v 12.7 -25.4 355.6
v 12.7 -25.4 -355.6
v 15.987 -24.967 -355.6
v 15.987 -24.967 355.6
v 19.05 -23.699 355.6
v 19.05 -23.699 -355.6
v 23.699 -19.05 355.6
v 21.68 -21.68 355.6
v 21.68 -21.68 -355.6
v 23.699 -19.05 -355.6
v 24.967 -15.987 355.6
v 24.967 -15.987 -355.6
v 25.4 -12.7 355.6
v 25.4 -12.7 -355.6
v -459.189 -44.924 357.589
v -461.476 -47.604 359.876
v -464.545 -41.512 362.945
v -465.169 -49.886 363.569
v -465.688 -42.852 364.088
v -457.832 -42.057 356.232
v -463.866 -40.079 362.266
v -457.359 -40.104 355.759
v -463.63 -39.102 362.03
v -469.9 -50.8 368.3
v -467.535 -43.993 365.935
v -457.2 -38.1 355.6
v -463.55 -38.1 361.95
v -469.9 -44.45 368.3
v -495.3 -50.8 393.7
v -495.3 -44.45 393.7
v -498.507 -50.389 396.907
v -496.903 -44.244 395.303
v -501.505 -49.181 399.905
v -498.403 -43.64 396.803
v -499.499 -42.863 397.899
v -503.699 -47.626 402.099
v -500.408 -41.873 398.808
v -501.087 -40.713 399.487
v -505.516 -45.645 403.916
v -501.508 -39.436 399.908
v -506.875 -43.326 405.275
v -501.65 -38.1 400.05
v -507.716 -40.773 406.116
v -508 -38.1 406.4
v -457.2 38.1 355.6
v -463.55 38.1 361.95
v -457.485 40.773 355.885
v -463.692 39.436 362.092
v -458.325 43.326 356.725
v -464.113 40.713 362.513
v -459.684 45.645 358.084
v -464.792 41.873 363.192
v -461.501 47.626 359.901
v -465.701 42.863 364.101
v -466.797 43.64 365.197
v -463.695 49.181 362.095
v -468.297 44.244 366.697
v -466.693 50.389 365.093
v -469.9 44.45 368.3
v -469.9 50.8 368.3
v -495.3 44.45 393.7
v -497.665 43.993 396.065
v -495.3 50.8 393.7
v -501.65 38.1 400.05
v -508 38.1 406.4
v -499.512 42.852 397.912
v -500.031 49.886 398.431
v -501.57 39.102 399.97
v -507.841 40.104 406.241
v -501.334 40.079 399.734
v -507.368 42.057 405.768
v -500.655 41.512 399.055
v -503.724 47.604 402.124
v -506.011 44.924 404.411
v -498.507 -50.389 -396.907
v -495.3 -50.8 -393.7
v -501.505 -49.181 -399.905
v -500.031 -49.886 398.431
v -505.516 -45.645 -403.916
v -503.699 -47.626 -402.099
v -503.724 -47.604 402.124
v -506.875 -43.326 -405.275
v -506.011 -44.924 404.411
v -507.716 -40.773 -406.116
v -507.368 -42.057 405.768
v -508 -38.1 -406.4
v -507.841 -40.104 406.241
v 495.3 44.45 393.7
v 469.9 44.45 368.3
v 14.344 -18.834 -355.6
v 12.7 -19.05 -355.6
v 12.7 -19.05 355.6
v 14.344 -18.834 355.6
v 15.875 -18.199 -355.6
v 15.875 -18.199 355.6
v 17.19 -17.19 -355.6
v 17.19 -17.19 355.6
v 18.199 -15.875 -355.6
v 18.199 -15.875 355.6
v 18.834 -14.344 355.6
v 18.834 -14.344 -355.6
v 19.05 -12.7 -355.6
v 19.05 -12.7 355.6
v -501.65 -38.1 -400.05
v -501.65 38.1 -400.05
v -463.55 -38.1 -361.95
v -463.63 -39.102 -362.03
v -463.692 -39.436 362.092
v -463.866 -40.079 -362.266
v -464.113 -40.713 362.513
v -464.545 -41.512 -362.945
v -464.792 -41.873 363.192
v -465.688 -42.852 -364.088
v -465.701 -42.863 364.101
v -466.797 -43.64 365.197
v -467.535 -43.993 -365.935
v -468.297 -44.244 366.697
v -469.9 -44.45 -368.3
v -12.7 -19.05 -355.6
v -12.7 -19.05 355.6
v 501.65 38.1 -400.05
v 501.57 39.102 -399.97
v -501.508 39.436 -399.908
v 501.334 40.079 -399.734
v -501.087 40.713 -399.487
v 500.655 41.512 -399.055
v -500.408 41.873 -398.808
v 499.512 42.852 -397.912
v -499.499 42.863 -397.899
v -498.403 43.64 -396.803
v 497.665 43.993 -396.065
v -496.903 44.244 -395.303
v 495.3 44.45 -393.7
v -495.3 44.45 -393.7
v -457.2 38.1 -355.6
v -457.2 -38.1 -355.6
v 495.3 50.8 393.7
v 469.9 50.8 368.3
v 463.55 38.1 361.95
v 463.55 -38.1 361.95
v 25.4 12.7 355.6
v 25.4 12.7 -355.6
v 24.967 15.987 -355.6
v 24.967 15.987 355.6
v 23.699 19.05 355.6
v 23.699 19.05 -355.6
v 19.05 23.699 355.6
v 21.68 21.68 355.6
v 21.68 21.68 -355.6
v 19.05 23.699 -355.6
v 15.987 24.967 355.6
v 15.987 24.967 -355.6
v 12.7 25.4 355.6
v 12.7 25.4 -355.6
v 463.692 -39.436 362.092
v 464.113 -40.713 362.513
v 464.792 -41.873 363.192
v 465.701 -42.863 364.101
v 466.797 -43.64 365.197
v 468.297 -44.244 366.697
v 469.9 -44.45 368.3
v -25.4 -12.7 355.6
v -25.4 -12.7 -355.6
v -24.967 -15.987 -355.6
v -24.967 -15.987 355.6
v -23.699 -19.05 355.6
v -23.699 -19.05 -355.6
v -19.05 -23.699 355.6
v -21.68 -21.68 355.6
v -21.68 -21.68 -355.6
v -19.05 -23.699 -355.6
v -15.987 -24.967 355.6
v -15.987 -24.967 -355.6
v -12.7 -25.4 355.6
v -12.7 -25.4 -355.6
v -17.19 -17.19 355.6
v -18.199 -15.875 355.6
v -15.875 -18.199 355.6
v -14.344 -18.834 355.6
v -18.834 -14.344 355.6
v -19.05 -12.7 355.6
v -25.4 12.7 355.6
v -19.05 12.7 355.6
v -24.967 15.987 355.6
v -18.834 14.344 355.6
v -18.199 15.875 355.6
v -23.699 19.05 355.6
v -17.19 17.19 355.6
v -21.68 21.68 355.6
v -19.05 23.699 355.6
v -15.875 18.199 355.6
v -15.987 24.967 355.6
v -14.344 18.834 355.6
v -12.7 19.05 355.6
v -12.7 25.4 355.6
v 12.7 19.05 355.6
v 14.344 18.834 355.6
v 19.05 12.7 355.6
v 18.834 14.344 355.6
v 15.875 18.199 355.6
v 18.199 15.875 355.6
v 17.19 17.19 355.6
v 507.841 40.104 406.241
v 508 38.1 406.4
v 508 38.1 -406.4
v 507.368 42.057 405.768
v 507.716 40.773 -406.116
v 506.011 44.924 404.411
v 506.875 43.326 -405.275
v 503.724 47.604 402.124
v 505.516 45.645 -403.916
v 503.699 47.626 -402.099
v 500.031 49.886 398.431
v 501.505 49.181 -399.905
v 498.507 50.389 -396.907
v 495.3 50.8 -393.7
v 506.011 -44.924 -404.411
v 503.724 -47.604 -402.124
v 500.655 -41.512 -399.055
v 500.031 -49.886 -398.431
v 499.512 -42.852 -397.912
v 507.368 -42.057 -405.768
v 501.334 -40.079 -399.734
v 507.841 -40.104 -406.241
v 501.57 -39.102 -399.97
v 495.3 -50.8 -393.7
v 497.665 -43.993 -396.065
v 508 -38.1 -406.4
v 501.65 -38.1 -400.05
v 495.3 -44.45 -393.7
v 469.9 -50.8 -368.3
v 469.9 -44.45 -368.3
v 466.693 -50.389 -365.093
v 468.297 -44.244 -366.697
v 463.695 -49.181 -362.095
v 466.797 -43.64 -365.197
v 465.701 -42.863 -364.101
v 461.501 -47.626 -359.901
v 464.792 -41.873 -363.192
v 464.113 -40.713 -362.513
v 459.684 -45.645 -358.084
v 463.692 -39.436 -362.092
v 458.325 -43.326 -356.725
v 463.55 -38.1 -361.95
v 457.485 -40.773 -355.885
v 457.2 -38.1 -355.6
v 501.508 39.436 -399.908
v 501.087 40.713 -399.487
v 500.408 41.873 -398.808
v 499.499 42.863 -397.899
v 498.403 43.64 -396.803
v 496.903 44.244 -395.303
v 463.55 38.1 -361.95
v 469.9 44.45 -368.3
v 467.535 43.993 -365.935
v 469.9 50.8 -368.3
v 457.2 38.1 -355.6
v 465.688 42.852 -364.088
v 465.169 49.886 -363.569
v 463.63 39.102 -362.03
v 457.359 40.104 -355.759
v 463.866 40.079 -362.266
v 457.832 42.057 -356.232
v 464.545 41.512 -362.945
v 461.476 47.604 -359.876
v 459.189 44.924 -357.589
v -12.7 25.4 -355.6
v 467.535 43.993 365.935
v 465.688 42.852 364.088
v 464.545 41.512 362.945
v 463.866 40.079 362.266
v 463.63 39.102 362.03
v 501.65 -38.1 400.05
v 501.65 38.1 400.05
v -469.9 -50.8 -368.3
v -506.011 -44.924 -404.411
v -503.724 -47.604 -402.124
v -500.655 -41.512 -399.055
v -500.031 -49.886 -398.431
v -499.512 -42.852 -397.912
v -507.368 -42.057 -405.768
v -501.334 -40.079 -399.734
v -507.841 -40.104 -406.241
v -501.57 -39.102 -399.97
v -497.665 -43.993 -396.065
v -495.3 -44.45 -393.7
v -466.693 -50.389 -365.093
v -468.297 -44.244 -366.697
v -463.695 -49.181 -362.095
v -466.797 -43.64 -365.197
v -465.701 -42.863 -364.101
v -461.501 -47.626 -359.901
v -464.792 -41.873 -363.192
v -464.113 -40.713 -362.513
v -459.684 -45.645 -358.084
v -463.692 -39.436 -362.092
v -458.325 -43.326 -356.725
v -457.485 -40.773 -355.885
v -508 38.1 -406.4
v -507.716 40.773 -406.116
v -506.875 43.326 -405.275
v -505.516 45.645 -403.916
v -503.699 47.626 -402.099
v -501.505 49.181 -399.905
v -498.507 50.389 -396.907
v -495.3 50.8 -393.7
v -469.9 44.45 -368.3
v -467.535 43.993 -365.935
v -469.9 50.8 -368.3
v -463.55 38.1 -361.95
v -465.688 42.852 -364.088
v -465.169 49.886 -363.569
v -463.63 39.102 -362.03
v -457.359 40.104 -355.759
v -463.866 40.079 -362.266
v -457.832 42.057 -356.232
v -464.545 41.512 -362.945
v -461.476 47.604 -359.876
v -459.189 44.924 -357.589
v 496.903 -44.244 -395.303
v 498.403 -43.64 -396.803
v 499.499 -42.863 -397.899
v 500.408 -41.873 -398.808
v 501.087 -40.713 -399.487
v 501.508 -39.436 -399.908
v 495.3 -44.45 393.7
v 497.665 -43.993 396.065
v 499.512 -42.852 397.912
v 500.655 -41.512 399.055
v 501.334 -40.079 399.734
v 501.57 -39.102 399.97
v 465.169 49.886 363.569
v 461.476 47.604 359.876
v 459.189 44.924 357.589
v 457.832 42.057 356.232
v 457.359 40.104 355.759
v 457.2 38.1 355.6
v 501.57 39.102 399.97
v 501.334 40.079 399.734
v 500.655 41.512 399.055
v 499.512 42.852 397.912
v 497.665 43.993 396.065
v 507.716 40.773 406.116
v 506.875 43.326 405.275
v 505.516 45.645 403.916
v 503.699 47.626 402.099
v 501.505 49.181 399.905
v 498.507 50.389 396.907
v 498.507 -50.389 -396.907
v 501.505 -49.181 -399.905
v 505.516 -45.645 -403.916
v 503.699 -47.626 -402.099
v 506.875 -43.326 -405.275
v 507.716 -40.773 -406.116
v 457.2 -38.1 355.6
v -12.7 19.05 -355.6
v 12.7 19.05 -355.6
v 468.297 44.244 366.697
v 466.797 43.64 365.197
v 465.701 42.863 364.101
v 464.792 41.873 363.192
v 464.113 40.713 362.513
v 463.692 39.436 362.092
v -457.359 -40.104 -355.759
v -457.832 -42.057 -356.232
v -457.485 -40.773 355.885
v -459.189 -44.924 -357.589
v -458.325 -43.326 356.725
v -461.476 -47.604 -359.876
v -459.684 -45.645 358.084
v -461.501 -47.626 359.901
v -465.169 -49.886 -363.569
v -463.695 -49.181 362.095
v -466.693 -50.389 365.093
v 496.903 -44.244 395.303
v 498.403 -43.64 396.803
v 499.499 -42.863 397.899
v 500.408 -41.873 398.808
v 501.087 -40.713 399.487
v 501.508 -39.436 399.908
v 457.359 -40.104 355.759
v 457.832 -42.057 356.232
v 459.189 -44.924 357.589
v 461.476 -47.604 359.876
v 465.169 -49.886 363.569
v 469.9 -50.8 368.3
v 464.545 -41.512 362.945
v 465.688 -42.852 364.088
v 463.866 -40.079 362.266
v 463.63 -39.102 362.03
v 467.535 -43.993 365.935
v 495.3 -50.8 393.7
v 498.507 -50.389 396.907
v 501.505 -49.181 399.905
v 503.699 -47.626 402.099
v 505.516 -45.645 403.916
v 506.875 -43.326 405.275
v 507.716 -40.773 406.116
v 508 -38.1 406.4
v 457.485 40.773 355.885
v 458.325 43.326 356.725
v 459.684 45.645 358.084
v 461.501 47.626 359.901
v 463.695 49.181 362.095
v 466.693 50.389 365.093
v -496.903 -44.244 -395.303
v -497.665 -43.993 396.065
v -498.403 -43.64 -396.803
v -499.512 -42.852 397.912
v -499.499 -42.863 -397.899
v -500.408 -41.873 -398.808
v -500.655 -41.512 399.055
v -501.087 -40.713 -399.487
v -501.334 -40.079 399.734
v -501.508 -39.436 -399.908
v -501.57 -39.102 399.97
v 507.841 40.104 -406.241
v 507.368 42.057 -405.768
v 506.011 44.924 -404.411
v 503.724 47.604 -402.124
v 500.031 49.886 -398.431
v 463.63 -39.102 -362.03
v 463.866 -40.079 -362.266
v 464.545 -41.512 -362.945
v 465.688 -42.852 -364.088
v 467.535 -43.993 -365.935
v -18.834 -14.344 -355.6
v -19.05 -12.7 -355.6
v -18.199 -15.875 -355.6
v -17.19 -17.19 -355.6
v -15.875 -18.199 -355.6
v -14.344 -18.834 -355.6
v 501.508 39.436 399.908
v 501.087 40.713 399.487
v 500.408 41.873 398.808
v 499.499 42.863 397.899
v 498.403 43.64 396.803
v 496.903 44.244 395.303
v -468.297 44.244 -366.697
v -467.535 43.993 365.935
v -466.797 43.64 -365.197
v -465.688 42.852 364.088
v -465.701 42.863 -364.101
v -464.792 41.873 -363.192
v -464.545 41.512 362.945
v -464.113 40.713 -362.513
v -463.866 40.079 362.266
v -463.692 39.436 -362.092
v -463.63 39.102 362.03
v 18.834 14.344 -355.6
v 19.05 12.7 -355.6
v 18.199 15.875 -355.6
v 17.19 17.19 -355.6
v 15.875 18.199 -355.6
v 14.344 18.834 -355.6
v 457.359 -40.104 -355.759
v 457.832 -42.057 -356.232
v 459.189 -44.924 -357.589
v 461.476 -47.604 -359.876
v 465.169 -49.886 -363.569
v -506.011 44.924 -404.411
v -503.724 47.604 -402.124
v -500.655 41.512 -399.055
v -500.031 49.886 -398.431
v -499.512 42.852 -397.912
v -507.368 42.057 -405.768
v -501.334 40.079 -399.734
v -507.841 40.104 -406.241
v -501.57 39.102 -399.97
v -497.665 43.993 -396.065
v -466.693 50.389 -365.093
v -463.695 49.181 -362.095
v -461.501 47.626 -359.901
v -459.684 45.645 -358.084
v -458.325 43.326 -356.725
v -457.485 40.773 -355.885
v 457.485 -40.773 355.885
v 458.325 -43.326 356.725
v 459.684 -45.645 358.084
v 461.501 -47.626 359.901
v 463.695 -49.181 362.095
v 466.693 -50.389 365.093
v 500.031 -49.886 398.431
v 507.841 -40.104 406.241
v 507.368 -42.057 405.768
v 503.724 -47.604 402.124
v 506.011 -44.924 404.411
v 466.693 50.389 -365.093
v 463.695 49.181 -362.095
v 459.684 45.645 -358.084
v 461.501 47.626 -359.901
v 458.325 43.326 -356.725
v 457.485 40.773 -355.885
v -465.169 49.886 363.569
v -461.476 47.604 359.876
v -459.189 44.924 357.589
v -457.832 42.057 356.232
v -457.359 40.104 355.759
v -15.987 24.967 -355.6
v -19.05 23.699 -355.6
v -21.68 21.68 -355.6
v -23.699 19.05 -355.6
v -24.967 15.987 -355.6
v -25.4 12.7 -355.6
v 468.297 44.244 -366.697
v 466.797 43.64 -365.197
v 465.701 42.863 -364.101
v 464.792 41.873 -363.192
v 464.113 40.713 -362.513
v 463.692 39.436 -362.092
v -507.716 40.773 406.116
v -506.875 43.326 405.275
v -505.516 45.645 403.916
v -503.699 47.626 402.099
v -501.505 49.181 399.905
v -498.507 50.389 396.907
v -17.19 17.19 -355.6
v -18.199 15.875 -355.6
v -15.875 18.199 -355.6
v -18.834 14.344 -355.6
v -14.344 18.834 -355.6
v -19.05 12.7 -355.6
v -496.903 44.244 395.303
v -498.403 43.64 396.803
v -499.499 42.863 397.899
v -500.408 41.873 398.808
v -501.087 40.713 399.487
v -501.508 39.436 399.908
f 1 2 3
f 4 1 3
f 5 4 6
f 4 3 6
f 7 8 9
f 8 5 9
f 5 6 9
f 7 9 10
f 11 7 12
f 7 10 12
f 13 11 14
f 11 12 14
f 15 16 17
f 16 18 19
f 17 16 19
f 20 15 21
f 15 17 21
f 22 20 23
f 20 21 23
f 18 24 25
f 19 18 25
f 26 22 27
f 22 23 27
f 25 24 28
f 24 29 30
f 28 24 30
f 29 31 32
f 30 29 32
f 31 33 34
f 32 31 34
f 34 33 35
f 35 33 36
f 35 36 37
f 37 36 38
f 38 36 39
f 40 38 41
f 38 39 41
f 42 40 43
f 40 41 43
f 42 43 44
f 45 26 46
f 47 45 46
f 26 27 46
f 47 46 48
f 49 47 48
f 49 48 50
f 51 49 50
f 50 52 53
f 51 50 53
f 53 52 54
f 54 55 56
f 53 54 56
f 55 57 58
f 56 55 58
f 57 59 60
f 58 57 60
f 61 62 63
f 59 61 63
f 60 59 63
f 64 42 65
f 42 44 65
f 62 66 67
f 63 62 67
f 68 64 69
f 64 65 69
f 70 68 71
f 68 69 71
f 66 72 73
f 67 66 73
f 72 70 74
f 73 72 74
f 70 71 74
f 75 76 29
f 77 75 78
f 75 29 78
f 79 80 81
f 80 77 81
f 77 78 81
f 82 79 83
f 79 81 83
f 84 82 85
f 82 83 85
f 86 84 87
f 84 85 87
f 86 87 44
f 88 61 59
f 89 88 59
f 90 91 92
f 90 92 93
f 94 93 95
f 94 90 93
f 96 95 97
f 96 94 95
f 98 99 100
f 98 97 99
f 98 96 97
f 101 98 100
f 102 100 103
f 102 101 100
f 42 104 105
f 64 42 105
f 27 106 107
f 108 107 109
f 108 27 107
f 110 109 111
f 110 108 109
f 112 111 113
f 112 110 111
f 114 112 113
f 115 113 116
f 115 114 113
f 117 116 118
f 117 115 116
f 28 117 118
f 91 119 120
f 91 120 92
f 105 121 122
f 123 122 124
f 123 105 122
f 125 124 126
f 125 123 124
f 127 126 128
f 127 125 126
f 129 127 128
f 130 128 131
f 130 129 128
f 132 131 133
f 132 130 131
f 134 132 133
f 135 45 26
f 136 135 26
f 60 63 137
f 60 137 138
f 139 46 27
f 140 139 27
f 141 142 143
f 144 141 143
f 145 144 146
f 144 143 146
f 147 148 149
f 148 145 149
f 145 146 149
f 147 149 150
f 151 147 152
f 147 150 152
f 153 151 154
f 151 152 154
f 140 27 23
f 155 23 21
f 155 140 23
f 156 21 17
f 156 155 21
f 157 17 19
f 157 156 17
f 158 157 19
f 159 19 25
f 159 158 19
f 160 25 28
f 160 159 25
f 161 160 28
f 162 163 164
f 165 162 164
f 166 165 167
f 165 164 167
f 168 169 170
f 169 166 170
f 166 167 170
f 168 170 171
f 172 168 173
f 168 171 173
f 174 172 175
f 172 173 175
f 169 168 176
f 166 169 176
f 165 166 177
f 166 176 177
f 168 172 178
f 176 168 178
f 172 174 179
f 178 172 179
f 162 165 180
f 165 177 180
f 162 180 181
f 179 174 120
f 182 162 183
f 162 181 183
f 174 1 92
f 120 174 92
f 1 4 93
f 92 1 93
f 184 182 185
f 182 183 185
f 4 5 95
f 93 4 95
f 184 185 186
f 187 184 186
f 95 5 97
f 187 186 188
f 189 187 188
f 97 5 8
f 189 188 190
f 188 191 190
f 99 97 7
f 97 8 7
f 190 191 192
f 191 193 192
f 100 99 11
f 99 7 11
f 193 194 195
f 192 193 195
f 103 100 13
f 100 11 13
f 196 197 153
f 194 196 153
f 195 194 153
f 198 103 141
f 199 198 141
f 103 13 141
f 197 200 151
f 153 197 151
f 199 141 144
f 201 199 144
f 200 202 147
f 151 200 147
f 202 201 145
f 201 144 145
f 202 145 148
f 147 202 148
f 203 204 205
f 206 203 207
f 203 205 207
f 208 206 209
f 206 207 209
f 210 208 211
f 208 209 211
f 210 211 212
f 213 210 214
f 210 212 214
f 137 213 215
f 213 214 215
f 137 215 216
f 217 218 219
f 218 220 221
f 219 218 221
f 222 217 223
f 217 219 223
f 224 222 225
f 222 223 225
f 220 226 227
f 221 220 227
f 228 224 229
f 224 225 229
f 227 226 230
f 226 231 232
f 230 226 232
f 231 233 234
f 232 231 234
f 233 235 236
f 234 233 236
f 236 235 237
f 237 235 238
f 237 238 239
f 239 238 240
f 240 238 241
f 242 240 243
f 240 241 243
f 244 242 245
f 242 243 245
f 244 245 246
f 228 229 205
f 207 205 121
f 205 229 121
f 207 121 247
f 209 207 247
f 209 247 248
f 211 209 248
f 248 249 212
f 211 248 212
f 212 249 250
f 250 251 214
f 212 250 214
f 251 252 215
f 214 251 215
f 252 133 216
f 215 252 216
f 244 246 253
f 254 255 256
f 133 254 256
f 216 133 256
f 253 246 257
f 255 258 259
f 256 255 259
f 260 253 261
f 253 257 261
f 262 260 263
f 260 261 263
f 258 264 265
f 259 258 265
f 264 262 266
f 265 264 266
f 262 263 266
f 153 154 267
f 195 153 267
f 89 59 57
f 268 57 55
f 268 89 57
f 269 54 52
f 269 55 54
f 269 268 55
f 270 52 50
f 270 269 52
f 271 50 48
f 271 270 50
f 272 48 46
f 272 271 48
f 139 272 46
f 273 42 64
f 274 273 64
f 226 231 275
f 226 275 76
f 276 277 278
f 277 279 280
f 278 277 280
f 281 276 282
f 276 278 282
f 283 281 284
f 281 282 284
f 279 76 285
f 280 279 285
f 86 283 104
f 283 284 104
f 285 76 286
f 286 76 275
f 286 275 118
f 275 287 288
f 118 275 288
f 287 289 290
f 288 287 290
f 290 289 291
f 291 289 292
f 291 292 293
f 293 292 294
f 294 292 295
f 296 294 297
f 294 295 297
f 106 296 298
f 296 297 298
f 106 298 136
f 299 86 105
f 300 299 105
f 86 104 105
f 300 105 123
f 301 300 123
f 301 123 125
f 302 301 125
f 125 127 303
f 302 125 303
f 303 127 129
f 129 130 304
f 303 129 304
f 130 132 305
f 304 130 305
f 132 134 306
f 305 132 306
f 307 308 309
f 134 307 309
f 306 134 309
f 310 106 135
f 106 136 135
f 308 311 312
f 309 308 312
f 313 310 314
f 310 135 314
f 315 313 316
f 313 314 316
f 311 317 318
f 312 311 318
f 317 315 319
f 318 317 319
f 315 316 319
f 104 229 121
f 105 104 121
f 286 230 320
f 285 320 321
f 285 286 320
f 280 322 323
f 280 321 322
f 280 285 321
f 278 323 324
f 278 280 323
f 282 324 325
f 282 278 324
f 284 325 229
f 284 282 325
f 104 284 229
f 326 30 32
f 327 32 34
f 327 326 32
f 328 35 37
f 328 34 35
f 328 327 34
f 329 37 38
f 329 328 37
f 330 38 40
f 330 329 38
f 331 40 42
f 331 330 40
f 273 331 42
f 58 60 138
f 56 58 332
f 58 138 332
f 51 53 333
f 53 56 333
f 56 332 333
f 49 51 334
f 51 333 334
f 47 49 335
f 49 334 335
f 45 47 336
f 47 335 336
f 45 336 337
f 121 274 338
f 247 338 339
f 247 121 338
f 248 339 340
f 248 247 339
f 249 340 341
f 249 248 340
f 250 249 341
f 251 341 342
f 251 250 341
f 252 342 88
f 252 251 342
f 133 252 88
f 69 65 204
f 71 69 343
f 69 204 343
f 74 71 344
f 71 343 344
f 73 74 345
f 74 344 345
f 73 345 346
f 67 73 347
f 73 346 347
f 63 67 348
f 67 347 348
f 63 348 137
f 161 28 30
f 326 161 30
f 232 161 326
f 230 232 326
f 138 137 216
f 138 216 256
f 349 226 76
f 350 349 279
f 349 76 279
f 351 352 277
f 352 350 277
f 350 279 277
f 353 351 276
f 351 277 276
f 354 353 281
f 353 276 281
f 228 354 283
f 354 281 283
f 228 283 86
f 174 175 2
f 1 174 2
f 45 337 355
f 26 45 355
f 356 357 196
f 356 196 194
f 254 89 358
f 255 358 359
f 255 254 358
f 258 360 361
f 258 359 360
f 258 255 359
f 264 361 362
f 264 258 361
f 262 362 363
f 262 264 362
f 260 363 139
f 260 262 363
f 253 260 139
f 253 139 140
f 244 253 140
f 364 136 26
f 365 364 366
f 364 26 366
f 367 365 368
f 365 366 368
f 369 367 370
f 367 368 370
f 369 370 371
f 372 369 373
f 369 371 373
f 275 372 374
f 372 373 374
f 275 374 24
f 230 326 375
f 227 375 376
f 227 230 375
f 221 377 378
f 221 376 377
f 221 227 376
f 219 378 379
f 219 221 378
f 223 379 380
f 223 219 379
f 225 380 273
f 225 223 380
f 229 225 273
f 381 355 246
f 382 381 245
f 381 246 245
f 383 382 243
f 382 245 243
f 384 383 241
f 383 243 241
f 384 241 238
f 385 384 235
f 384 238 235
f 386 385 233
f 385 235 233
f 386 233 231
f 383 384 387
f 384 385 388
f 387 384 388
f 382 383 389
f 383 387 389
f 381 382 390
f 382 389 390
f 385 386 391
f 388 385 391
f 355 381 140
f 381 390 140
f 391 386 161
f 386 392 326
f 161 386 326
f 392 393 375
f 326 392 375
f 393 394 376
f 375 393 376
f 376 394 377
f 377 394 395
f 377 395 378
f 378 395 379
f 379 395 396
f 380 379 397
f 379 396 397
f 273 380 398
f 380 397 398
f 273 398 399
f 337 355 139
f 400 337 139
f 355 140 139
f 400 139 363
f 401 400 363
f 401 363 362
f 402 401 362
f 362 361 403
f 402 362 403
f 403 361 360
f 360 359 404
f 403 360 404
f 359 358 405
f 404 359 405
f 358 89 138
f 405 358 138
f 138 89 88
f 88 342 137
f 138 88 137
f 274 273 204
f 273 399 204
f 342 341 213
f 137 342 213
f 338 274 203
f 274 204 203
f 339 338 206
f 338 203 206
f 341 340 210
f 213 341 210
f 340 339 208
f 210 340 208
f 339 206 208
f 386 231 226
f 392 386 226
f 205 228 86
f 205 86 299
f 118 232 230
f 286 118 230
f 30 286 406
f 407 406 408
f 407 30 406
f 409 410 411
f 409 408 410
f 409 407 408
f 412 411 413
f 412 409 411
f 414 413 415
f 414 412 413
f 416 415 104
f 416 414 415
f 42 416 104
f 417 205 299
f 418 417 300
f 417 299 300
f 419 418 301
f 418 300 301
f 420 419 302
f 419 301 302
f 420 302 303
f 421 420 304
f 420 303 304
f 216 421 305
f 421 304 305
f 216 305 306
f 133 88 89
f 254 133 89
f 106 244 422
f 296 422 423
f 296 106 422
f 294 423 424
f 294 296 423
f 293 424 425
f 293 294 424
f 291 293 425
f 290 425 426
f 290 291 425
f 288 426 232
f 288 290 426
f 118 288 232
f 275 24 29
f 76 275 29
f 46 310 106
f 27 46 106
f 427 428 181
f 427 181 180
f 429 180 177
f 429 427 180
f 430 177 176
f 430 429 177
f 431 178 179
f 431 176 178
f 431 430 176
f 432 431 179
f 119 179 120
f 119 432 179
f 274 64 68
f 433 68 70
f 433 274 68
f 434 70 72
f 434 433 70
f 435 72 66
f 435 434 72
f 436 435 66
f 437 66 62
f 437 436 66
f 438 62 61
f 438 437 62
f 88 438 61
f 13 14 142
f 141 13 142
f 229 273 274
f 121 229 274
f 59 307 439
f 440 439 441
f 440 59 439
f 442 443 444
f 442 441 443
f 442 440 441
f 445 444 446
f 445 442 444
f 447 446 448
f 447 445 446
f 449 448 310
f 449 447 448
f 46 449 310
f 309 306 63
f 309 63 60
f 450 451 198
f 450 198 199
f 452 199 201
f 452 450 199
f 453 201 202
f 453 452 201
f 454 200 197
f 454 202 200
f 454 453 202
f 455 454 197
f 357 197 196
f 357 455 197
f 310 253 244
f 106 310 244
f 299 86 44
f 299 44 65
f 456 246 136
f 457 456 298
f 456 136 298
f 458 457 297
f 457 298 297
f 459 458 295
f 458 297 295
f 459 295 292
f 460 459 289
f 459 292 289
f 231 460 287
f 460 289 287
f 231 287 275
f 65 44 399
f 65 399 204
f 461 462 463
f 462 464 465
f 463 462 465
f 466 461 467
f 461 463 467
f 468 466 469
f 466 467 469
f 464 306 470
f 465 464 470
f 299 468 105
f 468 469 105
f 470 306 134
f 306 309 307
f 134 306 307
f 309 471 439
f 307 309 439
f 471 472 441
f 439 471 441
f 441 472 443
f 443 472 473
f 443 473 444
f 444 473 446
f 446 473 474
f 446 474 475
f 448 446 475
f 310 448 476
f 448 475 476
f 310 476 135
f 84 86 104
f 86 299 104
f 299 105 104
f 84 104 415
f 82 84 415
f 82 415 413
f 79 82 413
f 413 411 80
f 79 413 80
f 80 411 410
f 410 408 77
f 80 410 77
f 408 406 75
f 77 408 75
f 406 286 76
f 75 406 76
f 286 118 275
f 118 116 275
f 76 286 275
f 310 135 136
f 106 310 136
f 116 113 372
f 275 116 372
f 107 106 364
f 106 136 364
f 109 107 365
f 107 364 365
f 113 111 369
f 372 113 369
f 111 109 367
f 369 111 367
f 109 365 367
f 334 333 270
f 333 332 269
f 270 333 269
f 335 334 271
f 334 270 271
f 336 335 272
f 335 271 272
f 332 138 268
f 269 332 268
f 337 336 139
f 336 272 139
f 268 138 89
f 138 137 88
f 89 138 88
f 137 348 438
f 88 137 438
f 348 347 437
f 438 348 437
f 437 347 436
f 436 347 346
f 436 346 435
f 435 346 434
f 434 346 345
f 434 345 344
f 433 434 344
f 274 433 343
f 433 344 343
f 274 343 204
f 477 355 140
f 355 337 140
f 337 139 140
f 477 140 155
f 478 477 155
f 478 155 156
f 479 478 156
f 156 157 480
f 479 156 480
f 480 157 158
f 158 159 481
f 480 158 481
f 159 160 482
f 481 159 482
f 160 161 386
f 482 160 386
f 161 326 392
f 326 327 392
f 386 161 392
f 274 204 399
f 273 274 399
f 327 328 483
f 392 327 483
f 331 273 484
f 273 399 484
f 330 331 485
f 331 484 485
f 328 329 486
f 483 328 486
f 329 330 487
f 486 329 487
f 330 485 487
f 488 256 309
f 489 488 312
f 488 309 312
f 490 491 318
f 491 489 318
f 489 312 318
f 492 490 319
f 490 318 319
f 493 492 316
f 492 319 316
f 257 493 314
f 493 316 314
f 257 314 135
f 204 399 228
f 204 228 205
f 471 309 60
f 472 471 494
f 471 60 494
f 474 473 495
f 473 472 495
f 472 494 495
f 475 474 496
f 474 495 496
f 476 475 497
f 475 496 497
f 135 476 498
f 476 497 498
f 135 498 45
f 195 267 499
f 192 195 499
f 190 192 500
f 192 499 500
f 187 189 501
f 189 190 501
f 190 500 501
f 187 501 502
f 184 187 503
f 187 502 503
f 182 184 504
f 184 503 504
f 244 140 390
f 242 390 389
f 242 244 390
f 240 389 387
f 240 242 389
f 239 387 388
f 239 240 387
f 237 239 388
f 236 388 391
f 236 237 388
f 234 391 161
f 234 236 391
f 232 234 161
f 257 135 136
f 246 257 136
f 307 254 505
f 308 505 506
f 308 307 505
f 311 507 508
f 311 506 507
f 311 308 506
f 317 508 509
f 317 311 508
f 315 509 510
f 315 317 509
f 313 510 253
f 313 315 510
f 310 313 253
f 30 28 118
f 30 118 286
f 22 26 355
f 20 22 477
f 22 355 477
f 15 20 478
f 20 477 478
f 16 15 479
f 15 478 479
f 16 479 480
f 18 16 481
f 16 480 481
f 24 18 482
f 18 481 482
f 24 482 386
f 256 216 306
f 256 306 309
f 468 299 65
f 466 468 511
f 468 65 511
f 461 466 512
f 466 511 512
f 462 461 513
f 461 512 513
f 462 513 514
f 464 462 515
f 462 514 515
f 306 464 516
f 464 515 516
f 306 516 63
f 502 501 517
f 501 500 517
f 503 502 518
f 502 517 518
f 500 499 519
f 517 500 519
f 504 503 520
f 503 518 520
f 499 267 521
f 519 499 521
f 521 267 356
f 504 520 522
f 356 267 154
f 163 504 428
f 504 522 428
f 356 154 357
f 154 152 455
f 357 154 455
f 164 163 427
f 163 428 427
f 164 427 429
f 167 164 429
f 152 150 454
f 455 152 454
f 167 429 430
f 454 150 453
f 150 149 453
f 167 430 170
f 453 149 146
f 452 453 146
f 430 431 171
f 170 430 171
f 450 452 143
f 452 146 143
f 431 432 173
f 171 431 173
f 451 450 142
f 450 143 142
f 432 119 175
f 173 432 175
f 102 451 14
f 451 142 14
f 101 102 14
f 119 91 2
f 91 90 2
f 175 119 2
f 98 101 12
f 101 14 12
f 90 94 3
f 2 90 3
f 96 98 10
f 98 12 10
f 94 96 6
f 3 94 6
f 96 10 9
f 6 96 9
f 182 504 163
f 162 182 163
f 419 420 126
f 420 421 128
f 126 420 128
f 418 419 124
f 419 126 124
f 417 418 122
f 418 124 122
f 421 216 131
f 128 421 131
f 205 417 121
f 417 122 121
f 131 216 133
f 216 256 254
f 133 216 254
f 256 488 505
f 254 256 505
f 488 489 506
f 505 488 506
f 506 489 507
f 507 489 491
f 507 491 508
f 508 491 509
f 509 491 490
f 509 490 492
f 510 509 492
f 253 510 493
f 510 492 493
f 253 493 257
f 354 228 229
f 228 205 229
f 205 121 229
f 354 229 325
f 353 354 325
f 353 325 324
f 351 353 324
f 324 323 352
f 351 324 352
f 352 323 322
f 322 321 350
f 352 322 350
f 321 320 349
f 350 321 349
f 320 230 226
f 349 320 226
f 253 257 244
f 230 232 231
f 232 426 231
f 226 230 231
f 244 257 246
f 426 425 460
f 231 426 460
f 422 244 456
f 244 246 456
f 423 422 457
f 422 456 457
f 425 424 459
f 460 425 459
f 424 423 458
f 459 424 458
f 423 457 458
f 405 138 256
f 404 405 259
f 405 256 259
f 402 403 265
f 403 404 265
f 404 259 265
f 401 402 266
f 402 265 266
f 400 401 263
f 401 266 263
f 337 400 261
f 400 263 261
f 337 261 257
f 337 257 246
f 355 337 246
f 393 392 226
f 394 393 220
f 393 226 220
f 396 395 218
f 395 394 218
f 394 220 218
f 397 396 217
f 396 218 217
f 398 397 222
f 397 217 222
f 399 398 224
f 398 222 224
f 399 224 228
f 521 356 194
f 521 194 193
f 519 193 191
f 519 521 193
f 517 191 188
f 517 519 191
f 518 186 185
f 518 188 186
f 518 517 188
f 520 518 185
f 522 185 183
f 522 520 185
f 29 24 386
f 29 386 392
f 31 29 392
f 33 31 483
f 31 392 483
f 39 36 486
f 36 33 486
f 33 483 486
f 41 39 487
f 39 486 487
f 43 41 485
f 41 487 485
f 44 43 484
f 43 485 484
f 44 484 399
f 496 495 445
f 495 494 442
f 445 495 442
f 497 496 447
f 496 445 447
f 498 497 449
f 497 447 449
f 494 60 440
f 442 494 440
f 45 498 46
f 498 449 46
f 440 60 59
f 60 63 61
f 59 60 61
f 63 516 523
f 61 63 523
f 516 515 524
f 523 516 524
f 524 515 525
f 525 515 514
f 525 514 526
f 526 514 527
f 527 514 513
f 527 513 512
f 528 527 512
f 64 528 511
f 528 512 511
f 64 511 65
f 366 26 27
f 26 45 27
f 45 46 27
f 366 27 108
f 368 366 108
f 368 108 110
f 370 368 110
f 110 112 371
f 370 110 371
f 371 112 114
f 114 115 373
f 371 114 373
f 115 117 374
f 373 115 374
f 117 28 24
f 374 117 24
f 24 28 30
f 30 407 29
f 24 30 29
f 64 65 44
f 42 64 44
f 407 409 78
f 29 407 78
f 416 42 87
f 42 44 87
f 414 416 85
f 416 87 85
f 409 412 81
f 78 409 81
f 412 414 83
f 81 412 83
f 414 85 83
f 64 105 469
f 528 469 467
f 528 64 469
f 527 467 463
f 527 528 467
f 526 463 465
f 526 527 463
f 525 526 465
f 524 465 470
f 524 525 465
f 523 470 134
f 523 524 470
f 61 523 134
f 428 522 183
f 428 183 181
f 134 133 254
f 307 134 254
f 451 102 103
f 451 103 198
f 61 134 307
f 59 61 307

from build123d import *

# Parameters (mm, degrees)
RECTANGULAR_TUBE_4_X_2_X_0_25_1_DEPTH      = 895.996094832
RECTANGULAR_TUBE_4_X_2_X_0_25_1_DEPTH_BACK = 83.196094832
RECTANGULAR_TUBE_4_X_2_X_0_25_1_2_DEPTH    = 1182.392189664
RECTANGULAR_TUBE_4_X_2_X_0_25_1_3_DEPTH    = 979.192189664
RECTANGULAR_TUBE_4_X_2_X_0_25_1_4_DEPTH    = 1182.392189664
SQUARE_TUBE_2_X_2_X_0_25_1_DEPTH           = 812.8


with BuildPart() as part:
    # Sketch1 → Rectangular tube 4 X 2 X 0.25(1) (new, two sides: drawn at the far end of the back side and taken through both)
    with BuildSketch(Plane(origin=(-482.600021971, 0, 406.4), x_dir=(-1, 0, 0), z_dir=(0, 0, -1)).offset(-RECTANGULAR_TUBE_4_X_2_X_0_25_1_DEPTH_BACK)):
        with BuildLine():
            Line((-12.699978029, -50.8), (12.699978029, -50.8))
            ThreePointArc((12.699978029, -50.8), (21.68023415, -47.080256121), (25.399978029, -38.1))
            Line((25.399978029, -38.1), (25.399978029, 38.1))
            ThreePointArc((25.399978029, 38.1), (21.68023415, 47.080256121), (12.699978029, 50.8))
            Line((12.699978029, 50.8), (-12.699978029, 50.8))
            ThreePointArc((-12.699978029, 50.8), (-21.68023415, 47.080256121), (-25.399978029, 38.1))
            Line((-25.399978029, 38.1), (-25.399978029, -38.1))
            ThreePointArc((-25.399978029, -38.1), (-21.68023415, -47.080256121), (-12.699978029, -50.8))
        make_face()
        with BuildLine():
            Line((-12.699978029, -44.45), (12.699978029, -44.45))
            ThreePointArc((12.699978029, -44.45), (17.19010609, -42.590128061), (19.049978029, -38.1))
            Line((19.049978029, -38.1), (19.049978029, 38.1))
            ThreePointArc((19.049978029, 38.1), (17.19010609, 42.590128061), (12.699978029, 44.45))
            Line((12.699978029, 44.45), (-12.699978029, 44.45))
            ThreePointArc((-12.699978029, 44.45), (-17.19010609, 42.590128061), (-19.049978029, 38.1))
            Line((-19.049978029, 38.1), (-19.049978029, -38.1))
            ThreePointArc((-19.049978029, -38.1), (-17.19010609, -42.590128061), (-12.699978029, -44.45))
        make_face(mode=Mode.SUBTRACT)
    extrude(amount=RECTANGULAR_TUBE_4_X_2_X_0_25_1_DEPTH + RECTANGULAR_TUBE_4_X_2_X_0_25_1_DEPTH_BACK)

    # Rectangular tube 4 X 2 X 0.25(1) mitre 1
    split(bisect_by=Plane(origin=(-508, 0, 406.4), x_dir=(0, -1, 0), z_dir=(-0.707106781, 0, -0.707106781)), keep=Keep.TOP)

    # Rectangular tube 4 X 2 X 0.25(1) mitre 2
    split(bisect_by=Plane(origin=(-508, 0, -406.4), x_dir=(0, -1, 0), z_dir=(-0.707106781, 0, 0.707106781)), keep=Keep.TOP)


with BuildPart() as body_2:
    # Sketch1 on segment 2 (carried to segment 2) → Rectangular tube 4 X 2 X 0.25_1 2 (new body)
    with BuildSketch(Plane(origin=(-591.196094832, 0, -381.000021971), x_dir=(0, 0, -1), z_dir=(1, 0, 0))):
        with BuildLine():
            Line((-12.699978029, -50.8), (12.699978029, -50.8))
            ThreePointArc((12.699978029, -50.8), (21.68023415, -47.080256121), (25.399978029, -38.1))
            Line((25.399978029, -38.1), (25.399978029, 38.1))
            ThreePointArc((25.399978029, 38.1), (21.68023415, 47.080256121), (12.699978029, 50.8))
            Line((12.699978029, 50.8), (-12.699978029, 50.8))
            ThreePointArc((-12.699978029, 50.8), (-21.68023415, 47.080256121), (-25.399978029, 38.1))
            Line((-25.399978029, 38.1), (-25.399978029, -38.1))
            ThreePointArc((-25.399978029, -38.1), (-21.68023415, -47.080256121), (-12.699978029, -50.8))
        make_face()
        with BuildLine():
            Line((-12.699978029, -44.45), (12.699978029, -44.45))
            ThreePointArc((12.699978029, -44.45), (17.19010609, -42.590128061), (19.049978029, -38.1))
            Line((19.049978029, -38.1), (19.049978029, 38.1))
            ThreePointArc((19.049978029, 38.1), (17.19010609, 42.590128061), (12.699978029, 44.45))
            Line((12.699978029, 44.45), (-12.699978029, 44.45))
            ThreePointArc((-12.699978029, 44.45), (-17.19010609, 42.590128061), (-19.049978029, 38.1))
            Line((-19.049978029, 38.1), (-19.049978029, -38.1))
            ThreePointArc((-19.049978029, -38.1), (-17.19010609, -42.590128061), (-12.699978029, -44.45))
        make_face(mode=Mode.SUBTRACT)
    extrude(amount=RECTANGULAR_TUBE_4_X_2_X_0_25_1_2_DEPTH)

    # Rectangular tube 4 X 2 X 0.25_1 2 mitre
    split(bisect_by=Plane(origin=(-508, 0, -406.4), x_dir=(0, 1, 0), z_dir=(0.707106781, 0, -0.707106781)), keep=Keep.TOP)

    # Rectangular tube 4 X 2 X 0.25_1 2 mi 2
    split(bisect_by=Plane(origin=(508, 0, -406.4), x_dir=(0, -1, 0), z_dir=(-0.707106781, 0, -0.707106781)), keep=Keep.TOP)


with BuildPart() as body_3:
    # Sketch1 on segment 3 (carried to segment 3) → Rectangular tube 4 X 2 X 0.25_1 3 (new body)
    with BuildSketch(Plane(origin=(482.600021971, 0, -489.596094832), x_dir=(1, 0, 0), z_dir=(0, 0, 1))):
        with BuildLine():
            Line((-12.699978029, -50.8), (12.699978029, -50.8))
            ThreePointArc((12.699978029, -50.8), (21.68023415, -47.080256121), (25.399978029, -38.1))
            Line((25.399978029, -38.1), (25.399978029, 38.1))
            ThreePointArc((25.399978029, 38.1), (21.68023415, 47.080256121), (12.699978029, 50.8))
            Line((12.699978029, 50.8), (-12.699978029, 50.8))
            ThreePointArc((-12.699978029, 50.8), (-21.68023415, 47.080256121), (-25.399978029, 38.1))
            Line((-25.399978029, 38.1), (-25.399978029, -38.1))
            ThreePointArc((-25.399978029, -38.1), (-21.68023415, -47.080256121), (-12.699978029, -50.8))
        make_face()
        with BuildLine():
            Line((-12.699978029, -44.45), (12.699978029, -44.45))
            ThreePointArc((12.699978029, -44.45), (17.19010609, -42.590128061), (19.049978029, -38.1))
            Line((19.049978029, -38.1), (19.049978029, 38.1))
            ThreePointArc((19.049978029, 38.1), (17.19010609, 42.590128061), (12.699978029, 44.45))
            Line((12.699978029, 44.45), (-12.699978029, 44.45))
            ThreePointArc((-12.699978029, 44.45), (-17.19010609, 42.590128061), (-19.049978029, 38.1))
            Line((-19.049978029, 38.1), (-19.049978029, -38.1))
            ThreePointArc((-19.049978029, -38.1), (-17.19010609, -42.590128061), (-12.699978029, -44.45))
        make_face(mode=Mode.SUBTRACT)
    extrude(amount=RECTANGULAR_TUBE_4_X_2_X_0_25_1_3_DEPTH)

    # Rectangular tube 4 X 2 X 0.25_1 3 mitre
    split(bisect_by=Plane(origin=(508, 0, 406.4), x_dir=(0, 1, 0), z_dir=(0.707106781, 0, -0.707106781)), keep=Keep.TOP)

    # Rectangular tube 4 X 2 X 0.25_1 3 mi 2
    split(bisect_by=Plane(origin=(508, 0, -406.4), x_dir=(0, 1, 0), z_dir=(0.707106781, 0, 0.707106781)), keep=Keep.TOP)


with BuildPart() as body_4:
    # Sketch1 on segment 4 (carried to segment 4) → Rectangular tube 4 X 2 X 0.25_1 4 (new body)
    with BuildSketch(Plane(origin=(591.196094832, 0, 381.000021971), x_dir=(0, 0, 1), z_dir=(-1, 0, 0))):
        with BuildLine():
            Line((-12.699978029, -50.8), (12.699978029, -50.8))
            ThreePointArc((12.699978029, -50.8), (21.68023415, -47.080256121), (25.399978029, -38.1))
            Line((25.399978029, -38.1), (25.399978029, 38.1))
            ThreePointArc((25.399978029, 38.1), (21.68023415, 47.080256121), (12.699978029, 50.8))
            Line((12.699978029, 50.8), (-12.699978029, 50.8))
            ThreePointArc((-12.699978029, 50.8), (-21.68023415, 47.080256121), (-25.399978029, 38.1))
            Line((-25.399978029, 38.1), (-25.399978029, -38.1))
            ThreePointArc((-25.399978029, -38.1), (-21.68023415, -47.080256121), (-12.699978029, -50.8))
        make_face()
        with BuildLine():
            Line((-12.699978029, -44.45), (12.699978029, -44.45))
            ThreePointArc((12.699978029, -44.45), (17.19010609, -42.590128061), (19.049978029, -38.1))
            Line((19.049978029, -38.1), (19.049978029, 38.1))
            ThreePointArc((19.049978029, 38.1), (17.19010609, 42.590128061), (12.699978029, 44.45))
            Line((12.699978029, 44.45), (-12.699978029, 44.45))
            ThreePointArc((-12.699978029, 44.45), (-17.19010609, 42.590128061), (-19.049978029, 38.1))
            Line((-19.049978029, 38.1), (-19.049978029, -38.1))
            ThreePointArc((-19.049978029, -38.1), (-17.19010609, -42.590128061), (-12.699978029, -44.45))
        make_face(mode=Mode.SUBTRACT)
    extrude(amount=RECTANGULAR_TUBE_4_X_2_X_0_25_1_4_DEPTH)

    # Rectangular tube 4 X 2 X 0.25_1 4 mitre
    split(bisect_by=Plane(origin=(-508, 0, 406.4), x_dir=(0, 1, 0), z_dir=(0.707106781, 0, 0.707106781)), keep=Keep.TOP)

    # Rectangular tube 4 X 2 X 0.25_1 4 mi 2
    split(bisect_by=Plane(origin=(508, 0, 406.4), x_dir=(0, -1, 0), z_dir=(-0.707106781, 0, 0.707106781)), keep=Keep.TOP)


with BuildPart() as body_5:
    # Sketch11 → Square tube 2 X 2 X 0.25(1) (new body)
    with BuildSketch(Plane.XY.offset(-406.4)):
        with BuildLine():
            Line((-12.7, -25.4), (12.7, -25.4))
            ThreePointArc((12.7, -25.4), (21.680256121, -21.680256121), (25.4, -12.7))
            Line((25.4, -12.7), (25.4, 12.7))
            ThreePointArc((25.4, 12.7), (21.680256121, 21.680256121), (12.7, 25.4))
            Line((12.7, 25.4), (-12.7, 25.4))
            ThreePointArc((-12.7, 25.4), (-21.680256121, 21.680256121), (-25.4, 12.7))
            Line((-25.4, 12.7), (-25.4, -12.7))
            ThreePointArc((-25.4, -12.7), (-21.680256121, -21.680256121), (-12.7, -25.4))
        make_face()
        with BuildLine():
            Line((-12.7, -19.05), (12.7, -19.05))
            ThreePointArc((12.7, -19.05), (17.190128061, -17.190128061), (19.05, -12.7))
            Line((19.05, -12.7), (19.05, 12.7))
            ThreePointArc((19.05, 12.7), (17.190128061, 17.190128061), (12.7, 19.05))
            Line((12.7, 19.05), (-12.7, 19.05))
            ThreePointArc((-12.7, 19.05), (-17.190128061, 17.190128061), (-19.05, 12.7))
            Line((-19.05, 12.7), (-19.05, -12.7))
            ThreePointArc((-19.05, -12.7), (-17.190128061, -17.190128061), (-12.7, -19.05))
        make_face(mode=Mode.SUBTRACT)
    extrude(amount=SQUARE_TUBE_2_X_2_X_0_25_1_DEPTH)

    # Trim/Extend1
    split(bisect_by=Plane(origin=(0, 0, -355.600043942), x_dir=(0, -1, 0), z_dir=(0, 0, 1)), keep=Keep.TOP)

    # Trim_Extend1 3
    split(bisect_by=Plane.YX.offset(-355.600043942), keep=Keep.TOP)


solid = Compound([part.part, body_2.part, body_3.part, body_4.part, body_5.part])
